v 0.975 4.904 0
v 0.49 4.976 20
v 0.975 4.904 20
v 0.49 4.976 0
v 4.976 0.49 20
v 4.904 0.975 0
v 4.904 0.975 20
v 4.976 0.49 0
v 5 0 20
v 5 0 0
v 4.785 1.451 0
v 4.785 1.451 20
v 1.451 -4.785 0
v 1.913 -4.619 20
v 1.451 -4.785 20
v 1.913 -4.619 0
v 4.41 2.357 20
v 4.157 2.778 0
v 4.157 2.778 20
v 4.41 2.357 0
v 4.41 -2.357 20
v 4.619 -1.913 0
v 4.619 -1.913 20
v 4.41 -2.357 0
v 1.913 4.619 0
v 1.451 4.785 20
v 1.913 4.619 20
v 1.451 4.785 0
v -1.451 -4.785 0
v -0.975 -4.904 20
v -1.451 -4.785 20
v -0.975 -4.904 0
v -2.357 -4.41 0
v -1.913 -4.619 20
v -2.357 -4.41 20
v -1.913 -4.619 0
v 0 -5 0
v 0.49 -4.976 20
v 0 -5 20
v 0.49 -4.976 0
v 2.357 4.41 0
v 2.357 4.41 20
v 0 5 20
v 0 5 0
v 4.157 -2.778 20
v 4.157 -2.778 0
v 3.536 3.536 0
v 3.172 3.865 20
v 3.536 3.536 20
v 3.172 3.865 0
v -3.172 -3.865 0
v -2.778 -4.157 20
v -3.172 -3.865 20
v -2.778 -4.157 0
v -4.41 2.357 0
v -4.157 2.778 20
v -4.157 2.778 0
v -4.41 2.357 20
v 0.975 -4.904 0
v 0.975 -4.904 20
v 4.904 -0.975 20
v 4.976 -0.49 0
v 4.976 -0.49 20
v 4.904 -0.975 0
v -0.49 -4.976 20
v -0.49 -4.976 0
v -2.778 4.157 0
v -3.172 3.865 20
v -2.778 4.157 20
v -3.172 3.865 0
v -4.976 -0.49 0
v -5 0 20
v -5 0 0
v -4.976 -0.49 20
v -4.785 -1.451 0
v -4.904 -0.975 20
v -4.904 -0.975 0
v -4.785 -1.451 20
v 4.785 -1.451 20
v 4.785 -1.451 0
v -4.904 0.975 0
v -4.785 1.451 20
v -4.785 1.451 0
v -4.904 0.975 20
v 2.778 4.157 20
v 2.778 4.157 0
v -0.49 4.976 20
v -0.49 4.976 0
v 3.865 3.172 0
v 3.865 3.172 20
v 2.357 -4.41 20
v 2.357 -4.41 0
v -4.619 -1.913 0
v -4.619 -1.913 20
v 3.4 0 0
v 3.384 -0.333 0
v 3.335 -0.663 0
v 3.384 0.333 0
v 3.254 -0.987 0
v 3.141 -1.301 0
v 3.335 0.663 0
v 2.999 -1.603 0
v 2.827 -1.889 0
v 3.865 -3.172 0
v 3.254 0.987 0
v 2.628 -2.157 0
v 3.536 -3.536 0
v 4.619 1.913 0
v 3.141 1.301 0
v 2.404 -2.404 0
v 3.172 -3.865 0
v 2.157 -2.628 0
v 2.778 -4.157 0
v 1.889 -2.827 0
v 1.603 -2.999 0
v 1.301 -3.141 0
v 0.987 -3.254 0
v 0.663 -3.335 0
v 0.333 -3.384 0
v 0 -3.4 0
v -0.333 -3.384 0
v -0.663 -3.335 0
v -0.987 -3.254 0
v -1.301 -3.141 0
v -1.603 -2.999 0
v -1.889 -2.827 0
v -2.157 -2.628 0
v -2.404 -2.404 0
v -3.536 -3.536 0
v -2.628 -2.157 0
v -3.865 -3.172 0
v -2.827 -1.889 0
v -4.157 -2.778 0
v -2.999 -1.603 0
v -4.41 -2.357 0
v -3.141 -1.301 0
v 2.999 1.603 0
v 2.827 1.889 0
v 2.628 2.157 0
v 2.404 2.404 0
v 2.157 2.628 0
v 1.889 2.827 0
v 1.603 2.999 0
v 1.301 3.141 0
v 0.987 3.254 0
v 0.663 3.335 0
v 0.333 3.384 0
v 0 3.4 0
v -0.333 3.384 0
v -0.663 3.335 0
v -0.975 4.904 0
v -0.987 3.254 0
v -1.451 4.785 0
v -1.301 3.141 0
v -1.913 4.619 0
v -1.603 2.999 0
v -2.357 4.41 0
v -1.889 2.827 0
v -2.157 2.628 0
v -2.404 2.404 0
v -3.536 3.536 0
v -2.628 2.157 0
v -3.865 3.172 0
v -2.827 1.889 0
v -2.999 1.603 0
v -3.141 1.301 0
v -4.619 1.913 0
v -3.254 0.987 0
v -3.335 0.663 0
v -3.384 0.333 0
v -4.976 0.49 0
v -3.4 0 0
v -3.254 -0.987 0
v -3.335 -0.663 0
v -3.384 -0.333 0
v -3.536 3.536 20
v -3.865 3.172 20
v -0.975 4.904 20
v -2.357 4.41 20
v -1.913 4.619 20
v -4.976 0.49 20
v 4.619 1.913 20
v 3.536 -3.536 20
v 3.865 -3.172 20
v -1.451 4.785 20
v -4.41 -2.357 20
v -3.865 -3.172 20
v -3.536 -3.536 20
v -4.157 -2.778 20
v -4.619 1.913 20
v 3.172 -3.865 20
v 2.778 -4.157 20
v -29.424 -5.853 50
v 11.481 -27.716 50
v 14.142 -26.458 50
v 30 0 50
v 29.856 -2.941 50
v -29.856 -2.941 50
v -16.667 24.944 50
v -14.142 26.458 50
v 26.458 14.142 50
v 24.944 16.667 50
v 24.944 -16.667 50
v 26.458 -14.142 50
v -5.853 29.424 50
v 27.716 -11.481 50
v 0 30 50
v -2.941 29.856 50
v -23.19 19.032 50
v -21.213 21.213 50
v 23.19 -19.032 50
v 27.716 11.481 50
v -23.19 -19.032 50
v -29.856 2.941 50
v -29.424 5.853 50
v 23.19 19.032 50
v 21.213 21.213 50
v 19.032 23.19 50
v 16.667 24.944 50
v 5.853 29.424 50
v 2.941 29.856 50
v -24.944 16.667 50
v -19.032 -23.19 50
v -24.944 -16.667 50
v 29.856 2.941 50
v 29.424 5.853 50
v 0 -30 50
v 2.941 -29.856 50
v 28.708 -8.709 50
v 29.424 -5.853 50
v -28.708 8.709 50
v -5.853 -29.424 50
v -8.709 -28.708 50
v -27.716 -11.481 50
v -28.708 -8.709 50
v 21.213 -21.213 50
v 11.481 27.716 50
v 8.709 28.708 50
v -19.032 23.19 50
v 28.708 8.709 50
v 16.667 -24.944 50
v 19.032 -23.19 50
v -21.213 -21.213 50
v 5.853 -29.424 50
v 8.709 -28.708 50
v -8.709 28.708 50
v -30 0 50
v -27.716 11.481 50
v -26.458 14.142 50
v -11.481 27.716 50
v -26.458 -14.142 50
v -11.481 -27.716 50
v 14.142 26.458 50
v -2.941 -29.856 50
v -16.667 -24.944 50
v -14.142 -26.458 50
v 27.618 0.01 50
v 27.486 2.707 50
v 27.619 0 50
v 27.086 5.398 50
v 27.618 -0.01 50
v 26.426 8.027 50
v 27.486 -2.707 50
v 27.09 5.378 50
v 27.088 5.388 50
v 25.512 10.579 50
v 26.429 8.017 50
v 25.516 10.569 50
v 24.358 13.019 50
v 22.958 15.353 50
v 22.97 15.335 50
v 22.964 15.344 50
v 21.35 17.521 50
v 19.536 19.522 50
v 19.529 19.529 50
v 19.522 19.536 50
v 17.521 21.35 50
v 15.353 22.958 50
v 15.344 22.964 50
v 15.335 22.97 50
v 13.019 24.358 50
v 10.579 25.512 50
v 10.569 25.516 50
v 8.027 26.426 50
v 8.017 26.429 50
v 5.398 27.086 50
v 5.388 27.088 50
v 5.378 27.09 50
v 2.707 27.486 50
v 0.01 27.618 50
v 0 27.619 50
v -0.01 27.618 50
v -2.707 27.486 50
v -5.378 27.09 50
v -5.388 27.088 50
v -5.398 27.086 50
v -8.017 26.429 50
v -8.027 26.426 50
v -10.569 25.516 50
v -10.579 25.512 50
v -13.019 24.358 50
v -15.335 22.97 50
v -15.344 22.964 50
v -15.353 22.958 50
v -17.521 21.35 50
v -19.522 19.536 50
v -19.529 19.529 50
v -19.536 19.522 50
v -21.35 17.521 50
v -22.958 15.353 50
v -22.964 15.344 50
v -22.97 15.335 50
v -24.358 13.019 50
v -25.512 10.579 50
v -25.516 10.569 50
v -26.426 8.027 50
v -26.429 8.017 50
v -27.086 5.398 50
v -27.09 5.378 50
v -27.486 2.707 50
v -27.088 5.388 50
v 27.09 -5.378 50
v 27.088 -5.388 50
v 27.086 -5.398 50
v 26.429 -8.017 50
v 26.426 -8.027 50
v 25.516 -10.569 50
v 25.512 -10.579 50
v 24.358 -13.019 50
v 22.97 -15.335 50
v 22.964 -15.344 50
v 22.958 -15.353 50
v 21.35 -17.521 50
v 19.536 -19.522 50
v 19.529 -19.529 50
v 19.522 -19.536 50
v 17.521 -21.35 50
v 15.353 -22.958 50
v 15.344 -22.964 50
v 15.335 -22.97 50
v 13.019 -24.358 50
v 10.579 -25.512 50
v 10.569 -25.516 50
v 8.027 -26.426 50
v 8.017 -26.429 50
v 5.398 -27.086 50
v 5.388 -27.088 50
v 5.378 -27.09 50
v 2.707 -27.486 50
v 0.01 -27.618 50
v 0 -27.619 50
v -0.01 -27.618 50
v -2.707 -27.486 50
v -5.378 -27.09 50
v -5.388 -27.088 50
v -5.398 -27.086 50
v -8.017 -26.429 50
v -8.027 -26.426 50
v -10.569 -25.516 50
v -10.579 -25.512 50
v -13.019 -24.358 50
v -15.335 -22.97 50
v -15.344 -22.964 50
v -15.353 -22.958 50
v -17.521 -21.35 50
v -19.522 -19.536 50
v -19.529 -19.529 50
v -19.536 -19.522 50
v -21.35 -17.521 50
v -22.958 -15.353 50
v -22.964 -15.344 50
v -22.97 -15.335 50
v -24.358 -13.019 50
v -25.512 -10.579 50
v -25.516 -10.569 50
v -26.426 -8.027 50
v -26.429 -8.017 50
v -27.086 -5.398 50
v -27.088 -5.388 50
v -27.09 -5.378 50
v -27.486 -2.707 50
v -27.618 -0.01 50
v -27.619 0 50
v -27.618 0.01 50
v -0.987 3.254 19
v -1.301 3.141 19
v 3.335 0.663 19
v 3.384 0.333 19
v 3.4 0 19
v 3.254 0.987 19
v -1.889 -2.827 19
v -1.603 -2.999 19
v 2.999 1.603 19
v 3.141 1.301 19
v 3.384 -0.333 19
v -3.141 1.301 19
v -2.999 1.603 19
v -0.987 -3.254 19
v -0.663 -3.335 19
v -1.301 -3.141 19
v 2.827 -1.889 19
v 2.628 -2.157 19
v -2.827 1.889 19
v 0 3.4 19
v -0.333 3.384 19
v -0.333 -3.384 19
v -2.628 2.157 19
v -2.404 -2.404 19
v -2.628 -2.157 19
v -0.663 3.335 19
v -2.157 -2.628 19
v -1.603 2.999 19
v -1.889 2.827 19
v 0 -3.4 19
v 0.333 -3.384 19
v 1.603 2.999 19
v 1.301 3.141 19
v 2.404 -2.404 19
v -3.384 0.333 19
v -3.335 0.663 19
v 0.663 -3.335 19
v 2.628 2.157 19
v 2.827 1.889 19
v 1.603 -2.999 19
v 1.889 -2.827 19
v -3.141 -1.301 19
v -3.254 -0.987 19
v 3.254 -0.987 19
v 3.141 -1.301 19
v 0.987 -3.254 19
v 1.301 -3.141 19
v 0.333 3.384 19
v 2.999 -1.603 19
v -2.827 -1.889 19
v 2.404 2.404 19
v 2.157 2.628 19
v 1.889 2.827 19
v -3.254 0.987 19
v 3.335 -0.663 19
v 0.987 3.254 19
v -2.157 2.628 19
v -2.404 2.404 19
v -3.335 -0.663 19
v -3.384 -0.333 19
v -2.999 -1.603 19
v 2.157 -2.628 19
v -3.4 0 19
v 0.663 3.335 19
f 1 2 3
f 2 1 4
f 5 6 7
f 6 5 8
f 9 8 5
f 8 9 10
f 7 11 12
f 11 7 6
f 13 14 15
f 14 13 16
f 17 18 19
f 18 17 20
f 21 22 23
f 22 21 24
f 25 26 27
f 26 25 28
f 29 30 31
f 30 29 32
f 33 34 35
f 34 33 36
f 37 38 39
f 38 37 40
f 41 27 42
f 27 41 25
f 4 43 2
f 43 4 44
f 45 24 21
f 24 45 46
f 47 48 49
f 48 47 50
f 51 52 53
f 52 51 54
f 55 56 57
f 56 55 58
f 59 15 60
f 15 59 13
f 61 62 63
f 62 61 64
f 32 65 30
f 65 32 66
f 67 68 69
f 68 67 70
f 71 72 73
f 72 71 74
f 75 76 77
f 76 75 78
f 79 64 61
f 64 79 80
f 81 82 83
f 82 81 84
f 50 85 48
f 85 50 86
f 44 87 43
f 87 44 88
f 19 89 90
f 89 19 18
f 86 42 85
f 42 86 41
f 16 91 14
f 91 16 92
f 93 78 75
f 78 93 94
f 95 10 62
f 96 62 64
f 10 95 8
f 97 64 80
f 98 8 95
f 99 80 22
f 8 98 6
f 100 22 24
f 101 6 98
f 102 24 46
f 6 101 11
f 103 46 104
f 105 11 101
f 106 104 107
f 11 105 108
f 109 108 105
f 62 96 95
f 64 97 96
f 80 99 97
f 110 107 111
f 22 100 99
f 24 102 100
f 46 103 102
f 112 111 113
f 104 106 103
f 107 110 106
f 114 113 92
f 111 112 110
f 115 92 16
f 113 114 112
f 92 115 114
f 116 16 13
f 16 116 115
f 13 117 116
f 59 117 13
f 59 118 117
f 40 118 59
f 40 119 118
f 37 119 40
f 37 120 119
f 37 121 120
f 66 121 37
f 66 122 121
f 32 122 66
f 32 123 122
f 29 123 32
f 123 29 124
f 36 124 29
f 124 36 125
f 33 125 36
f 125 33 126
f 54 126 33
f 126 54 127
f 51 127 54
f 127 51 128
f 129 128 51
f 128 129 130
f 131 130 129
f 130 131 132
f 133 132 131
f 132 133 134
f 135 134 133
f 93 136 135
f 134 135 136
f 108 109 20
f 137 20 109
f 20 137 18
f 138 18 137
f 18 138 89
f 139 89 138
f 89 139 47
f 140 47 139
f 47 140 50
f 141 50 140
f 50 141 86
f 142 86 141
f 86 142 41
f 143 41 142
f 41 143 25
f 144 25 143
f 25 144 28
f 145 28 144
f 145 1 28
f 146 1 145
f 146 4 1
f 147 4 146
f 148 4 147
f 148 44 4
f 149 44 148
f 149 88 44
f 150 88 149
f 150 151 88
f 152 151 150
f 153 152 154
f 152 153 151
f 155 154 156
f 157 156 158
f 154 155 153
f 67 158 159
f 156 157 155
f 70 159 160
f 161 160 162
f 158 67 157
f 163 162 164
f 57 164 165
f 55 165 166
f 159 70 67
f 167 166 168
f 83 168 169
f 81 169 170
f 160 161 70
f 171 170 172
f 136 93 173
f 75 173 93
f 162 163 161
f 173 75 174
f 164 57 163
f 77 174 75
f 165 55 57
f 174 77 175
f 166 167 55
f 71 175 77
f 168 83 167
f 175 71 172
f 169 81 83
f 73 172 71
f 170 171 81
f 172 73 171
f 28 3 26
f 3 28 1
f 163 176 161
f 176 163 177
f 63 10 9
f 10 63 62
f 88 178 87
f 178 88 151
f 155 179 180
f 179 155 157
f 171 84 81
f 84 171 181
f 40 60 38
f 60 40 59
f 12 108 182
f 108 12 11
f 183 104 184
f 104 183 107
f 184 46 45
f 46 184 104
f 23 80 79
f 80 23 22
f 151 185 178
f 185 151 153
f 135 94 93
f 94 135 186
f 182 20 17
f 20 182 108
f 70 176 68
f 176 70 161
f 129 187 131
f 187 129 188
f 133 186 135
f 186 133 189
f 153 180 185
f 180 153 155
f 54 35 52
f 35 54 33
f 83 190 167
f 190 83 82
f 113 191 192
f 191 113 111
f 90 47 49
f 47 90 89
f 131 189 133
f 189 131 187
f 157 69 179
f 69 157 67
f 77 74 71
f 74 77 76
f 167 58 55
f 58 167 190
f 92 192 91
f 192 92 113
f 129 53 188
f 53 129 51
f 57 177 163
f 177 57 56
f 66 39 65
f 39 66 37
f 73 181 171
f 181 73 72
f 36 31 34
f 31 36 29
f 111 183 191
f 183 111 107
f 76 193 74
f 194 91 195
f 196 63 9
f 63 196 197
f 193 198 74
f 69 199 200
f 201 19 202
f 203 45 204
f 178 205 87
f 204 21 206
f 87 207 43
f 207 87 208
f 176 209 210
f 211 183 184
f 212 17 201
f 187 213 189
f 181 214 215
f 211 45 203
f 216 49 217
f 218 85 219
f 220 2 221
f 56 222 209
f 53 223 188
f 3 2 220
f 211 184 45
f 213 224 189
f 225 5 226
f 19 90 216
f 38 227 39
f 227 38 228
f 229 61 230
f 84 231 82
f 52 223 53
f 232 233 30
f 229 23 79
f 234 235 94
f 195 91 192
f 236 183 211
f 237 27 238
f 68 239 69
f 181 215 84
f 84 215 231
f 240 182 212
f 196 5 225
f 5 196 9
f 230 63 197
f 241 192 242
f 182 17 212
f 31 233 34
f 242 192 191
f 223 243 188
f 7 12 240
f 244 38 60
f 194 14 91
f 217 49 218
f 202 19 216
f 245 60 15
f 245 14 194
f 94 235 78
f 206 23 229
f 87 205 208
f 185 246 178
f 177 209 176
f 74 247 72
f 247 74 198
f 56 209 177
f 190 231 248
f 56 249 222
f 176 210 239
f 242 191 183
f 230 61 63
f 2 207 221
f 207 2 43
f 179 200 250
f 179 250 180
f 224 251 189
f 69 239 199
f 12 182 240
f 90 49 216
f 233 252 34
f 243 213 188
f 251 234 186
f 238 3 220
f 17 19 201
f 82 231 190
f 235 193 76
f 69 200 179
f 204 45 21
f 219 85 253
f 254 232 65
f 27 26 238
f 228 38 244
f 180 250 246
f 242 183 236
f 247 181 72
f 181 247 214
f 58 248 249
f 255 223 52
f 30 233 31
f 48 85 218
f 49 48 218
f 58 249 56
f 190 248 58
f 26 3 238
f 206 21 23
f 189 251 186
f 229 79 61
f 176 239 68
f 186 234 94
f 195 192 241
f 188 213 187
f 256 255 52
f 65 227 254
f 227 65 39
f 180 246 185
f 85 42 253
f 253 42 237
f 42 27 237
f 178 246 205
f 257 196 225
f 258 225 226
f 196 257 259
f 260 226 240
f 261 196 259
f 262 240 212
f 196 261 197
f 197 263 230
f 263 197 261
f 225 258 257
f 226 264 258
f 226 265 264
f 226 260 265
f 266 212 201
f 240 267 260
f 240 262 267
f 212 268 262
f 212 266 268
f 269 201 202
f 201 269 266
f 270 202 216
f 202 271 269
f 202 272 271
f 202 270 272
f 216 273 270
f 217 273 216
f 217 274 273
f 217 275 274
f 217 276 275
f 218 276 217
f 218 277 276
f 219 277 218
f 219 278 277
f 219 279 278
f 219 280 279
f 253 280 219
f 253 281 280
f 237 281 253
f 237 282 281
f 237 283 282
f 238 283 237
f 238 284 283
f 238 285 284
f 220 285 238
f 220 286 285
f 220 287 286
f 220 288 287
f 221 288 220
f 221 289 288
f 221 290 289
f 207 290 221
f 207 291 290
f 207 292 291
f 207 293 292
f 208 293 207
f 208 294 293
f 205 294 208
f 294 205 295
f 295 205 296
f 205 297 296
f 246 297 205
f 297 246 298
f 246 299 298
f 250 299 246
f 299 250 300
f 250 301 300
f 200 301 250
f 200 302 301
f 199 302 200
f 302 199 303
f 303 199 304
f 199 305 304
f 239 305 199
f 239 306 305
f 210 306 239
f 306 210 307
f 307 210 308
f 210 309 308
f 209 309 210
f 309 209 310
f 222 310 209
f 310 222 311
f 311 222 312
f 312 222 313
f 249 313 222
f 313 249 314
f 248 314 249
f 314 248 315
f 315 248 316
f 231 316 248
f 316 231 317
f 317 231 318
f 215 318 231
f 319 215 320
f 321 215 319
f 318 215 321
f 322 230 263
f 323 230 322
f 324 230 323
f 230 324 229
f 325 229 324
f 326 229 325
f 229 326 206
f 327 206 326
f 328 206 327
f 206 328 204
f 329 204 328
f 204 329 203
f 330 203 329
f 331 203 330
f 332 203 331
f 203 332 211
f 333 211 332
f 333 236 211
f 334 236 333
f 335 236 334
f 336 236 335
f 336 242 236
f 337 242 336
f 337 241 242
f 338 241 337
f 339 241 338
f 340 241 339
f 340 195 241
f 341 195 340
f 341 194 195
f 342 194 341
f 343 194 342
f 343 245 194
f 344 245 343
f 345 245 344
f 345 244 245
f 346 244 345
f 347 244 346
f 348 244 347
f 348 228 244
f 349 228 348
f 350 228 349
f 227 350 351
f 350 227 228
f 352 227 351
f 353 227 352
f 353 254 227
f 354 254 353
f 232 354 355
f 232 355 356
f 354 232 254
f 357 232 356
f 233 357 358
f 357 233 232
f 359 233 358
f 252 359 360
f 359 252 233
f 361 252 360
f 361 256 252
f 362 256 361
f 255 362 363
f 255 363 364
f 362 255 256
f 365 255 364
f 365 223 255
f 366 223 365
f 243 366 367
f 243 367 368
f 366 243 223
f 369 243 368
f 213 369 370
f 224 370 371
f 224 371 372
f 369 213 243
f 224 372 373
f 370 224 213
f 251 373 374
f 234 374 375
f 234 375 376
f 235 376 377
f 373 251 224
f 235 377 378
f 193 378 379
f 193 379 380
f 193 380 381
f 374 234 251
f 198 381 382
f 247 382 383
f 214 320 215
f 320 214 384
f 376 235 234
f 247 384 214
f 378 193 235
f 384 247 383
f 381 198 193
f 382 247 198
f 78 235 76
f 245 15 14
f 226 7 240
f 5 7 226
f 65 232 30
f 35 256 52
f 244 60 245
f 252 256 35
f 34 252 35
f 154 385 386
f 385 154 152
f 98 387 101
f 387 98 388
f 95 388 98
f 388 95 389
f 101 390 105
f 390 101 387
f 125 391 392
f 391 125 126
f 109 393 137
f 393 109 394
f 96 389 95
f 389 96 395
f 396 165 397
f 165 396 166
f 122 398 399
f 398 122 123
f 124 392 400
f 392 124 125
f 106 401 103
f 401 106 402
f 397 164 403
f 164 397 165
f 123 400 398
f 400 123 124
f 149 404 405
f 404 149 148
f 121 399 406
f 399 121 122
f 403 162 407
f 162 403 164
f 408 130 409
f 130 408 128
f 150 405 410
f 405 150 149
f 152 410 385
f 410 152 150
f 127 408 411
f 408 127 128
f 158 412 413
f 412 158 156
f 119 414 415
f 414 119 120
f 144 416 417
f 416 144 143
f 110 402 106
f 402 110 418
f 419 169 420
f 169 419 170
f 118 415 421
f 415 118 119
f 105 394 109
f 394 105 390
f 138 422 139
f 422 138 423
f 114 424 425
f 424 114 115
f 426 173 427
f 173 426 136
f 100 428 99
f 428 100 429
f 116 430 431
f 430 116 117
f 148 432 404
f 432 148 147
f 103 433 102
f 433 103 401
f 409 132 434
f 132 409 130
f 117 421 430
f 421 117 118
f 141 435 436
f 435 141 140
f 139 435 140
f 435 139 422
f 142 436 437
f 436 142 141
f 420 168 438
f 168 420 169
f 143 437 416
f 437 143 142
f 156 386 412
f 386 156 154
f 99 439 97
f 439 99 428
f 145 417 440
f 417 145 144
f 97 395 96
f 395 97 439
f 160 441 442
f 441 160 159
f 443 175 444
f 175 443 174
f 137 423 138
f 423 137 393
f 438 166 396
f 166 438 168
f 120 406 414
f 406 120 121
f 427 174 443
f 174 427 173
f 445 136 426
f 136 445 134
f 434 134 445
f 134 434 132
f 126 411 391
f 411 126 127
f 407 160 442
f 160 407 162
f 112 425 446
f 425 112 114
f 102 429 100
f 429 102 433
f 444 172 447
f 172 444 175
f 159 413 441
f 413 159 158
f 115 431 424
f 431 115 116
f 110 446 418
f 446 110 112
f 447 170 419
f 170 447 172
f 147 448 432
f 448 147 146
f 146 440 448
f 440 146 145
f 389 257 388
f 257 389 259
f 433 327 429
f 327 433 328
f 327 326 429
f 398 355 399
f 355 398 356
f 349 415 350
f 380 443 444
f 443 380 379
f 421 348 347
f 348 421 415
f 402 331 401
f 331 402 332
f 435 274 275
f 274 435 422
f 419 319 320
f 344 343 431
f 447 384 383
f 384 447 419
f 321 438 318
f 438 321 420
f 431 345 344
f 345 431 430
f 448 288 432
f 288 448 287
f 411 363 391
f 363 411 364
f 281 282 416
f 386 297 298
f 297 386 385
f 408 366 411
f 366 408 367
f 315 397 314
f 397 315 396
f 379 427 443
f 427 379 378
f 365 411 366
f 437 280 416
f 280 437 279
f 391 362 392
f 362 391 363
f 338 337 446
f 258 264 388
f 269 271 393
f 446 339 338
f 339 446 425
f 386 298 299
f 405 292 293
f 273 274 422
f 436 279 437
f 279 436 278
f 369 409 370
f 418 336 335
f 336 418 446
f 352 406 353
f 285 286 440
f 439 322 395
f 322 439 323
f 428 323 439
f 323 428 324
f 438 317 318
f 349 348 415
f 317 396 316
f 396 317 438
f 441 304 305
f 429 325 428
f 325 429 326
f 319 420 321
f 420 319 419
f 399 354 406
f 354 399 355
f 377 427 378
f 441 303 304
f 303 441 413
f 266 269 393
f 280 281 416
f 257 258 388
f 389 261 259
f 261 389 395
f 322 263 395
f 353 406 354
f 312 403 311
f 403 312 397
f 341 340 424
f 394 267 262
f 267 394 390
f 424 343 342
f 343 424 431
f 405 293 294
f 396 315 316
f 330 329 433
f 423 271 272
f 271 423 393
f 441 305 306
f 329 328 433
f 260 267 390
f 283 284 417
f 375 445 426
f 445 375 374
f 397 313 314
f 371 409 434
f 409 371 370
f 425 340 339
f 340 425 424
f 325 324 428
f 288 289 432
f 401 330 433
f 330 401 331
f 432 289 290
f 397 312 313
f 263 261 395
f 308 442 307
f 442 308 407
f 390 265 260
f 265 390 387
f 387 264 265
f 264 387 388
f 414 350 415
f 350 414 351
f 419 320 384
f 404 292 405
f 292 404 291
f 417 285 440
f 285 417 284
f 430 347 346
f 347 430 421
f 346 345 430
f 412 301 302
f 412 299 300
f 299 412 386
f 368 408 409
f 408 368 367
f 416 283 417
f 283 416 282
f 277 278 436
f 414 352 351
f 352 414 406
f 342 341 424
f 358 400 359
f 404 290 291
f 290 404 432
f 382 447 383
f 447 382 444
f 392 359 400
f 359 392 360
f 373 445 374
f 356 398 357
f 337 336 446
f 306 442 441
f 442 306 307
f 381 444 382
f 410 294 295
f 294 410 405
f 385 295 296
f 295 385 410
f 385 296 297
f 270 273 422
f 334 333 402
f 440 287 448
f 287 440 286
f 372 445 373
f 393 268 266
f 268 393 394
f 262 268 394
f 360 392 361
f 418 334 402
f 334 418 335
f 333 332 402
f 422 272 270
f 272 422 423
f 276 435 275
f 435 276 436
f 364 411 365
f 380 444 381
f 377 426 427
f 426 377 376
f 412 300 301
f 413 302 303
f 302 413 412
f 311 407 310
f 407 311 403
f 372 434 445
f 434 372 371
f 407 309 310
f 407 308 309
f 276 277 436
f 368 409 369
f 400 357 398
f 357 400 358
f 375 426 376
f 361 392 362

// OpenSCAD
// --- Dimensions ---
spout_od = 10;             // Outer diameter of the spout (mm)
spout_height = 20;         // Height of the spout (mm)
funnel_top_od = 60;        // Outer diameter at the top rim (mm)
funnel_height = 30;        // Height of the cone section (mm)
wall_thickness = 1.6;      // Wall thickness (mm)

// --- Calculated Values ---
spout_id = spout_od - 2 * wall_thickness; // Inner diameter of the spout
funnel_top_id = funnel_top_od - 2 * wall_thickness; // Inner diameter at the top rim

// --- Parameters ---
$fn = 64;

// --- Model ---
difference() {
    // Outer Shell
    union() {
        // Spout: A straight cylinder from z=0 to z=20
        cylinder(d=spout_od, h=spout_height);
        
        // Funnel: A cone (frustum) from z=20 to z=50
        translate([0, 0, spout_height])
            cylinder(d1=spout_od, d2=funnel_top_od, h=funnel_height);
    }

    // Inner Hollow (to be subtracted)
    union() {
        // Spout Bore: A cylinder that extends slightly below z=0 to ensure an open bottom
        translate([0, 0, -1])
            cylinder(d=spout_id, h=spout_height + 2);
        
        // Funnel Bore: A cone that extends slightly above z=50 to ensure an open top
        // It starts at the spout junction to create a continuous internal passage
        translate([0, 0, spout_height - 1])
            cylinder(d1=spout_id, d2=funnel_top_id, h=funnel_height + 2);
    }
}
